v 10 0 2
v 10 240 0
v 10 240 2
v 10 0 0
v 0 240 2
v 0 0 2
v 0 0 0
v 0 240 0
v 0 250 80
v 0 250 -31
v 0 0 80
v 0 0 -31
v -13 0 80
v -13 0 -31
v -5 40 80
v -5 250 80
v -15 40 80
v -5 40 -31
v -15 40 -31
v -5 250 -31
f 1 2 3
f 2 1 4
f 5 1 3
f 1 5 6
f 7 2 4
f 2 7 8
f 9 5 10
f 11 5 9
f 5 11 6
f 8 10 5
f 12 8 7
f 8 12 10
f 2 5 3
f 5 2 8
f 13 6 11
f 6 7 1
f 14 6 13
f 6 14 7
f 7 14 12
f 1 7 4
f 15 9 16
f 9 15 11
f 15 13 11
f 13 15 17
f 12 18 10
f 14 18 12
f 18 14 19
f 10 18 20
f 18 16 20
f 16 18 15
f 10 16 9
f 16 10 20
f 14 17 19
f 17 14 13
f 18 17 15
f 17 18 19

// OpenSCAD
max_print_width = 250; // millimeters
print_thickness = 5;
print_height = 80;
wall_to_fridge = 210;
wall_tile_thickness = 10;
counter_to_fridge_a = 15;
counter_to_fridge_b = 13; // at max_print_width from wall
counter_thickness = 31;
counter_overhang = 10;
overhang_thickness = 2;

module overhang() {
  // TODO: maybe make this a sloped plane instead?
  cube([counter_overhang, max_print_width - wall_tile_thickness, overhang_thickness]);
}

module fence() {
  // the counter will extend from origin towards +x and the countertop
  // will be the xz plane
  rotate([0, -90, 0])
    linear_extrude(print_thickness)
      polygon(
        [
          [-counter_thickness, 0],
          [-counter_thickness, max_print_width],
          [print_height, max_print_width],
          [print_height, 0],
        ]
      );
}

module wedge() {
  rotate([0, 180, 0])
    translate([0, 0, -print_height])
      linear_extrude(print_height + counter_thickness)
        polygon(
          [
            [0, 0],
            [0, max_print_width - wall_to_fridge],
            [counter_to_fridge_a, max_print_width - wall_to_fridge],
            [counter_to_fridge_b, 0],
          ]
        );
}

module main() {
  overhang();
  fence();
  wedge();
}

main();
